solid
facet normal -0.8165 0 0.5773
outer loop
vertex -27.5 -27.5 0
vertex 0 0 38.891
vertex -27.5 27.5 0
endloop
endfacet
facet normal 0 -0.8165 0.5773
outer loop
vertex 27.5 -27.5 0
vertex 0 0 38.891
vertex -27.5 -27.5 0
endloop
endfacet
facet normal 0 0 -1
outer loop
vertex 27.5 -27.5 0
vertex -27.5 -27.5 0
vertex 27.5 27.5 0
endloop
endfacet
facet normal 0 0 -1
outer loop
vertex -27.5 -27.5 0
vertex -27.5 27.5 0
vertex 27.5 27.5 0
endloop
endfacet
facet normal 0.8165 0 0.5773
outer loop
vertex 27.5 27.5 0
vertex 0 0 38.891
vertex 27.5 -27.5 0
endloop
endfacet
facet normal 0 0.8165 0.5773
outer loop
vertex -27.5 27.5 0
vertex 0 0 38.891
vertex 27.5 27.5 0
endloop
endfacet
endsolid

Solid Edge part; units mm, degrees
sketch "Sketch1" plane through (0, 0, 0) normal (0, 0, 1) x (1, 0, 0)
  line L0 (-27.5, -27.5) -> (27.5, -27.5)
  line L1 (27.5, -27.5) -> (27.5, 27.5)
  line L2 (27.5, 27.5) -> (-27.5, 27.5)
  line L3 (-27.5, 27.5) -> (-27.5, -27.5)
extrude "Protrusion1" add sketch "Sketch1" along normal up to vertex (38.8909 mm away)
sketch "Sketch2" plane through (0, 0, 0) normal (1, 0, 0) x (0, 1, 0)
  line L0 (-27.5, 0) -> (0, 38.8909)
extrude "Cutout1" cut sketch "Sketch2" along normal mid plane 82.5125 material side at (0, -13.7908, 19.4743)
pattern_circular "Pattern1" count 4 over 360 about axis through (0, 0, 0) along (0, 0, -1) of "Cutout1"
